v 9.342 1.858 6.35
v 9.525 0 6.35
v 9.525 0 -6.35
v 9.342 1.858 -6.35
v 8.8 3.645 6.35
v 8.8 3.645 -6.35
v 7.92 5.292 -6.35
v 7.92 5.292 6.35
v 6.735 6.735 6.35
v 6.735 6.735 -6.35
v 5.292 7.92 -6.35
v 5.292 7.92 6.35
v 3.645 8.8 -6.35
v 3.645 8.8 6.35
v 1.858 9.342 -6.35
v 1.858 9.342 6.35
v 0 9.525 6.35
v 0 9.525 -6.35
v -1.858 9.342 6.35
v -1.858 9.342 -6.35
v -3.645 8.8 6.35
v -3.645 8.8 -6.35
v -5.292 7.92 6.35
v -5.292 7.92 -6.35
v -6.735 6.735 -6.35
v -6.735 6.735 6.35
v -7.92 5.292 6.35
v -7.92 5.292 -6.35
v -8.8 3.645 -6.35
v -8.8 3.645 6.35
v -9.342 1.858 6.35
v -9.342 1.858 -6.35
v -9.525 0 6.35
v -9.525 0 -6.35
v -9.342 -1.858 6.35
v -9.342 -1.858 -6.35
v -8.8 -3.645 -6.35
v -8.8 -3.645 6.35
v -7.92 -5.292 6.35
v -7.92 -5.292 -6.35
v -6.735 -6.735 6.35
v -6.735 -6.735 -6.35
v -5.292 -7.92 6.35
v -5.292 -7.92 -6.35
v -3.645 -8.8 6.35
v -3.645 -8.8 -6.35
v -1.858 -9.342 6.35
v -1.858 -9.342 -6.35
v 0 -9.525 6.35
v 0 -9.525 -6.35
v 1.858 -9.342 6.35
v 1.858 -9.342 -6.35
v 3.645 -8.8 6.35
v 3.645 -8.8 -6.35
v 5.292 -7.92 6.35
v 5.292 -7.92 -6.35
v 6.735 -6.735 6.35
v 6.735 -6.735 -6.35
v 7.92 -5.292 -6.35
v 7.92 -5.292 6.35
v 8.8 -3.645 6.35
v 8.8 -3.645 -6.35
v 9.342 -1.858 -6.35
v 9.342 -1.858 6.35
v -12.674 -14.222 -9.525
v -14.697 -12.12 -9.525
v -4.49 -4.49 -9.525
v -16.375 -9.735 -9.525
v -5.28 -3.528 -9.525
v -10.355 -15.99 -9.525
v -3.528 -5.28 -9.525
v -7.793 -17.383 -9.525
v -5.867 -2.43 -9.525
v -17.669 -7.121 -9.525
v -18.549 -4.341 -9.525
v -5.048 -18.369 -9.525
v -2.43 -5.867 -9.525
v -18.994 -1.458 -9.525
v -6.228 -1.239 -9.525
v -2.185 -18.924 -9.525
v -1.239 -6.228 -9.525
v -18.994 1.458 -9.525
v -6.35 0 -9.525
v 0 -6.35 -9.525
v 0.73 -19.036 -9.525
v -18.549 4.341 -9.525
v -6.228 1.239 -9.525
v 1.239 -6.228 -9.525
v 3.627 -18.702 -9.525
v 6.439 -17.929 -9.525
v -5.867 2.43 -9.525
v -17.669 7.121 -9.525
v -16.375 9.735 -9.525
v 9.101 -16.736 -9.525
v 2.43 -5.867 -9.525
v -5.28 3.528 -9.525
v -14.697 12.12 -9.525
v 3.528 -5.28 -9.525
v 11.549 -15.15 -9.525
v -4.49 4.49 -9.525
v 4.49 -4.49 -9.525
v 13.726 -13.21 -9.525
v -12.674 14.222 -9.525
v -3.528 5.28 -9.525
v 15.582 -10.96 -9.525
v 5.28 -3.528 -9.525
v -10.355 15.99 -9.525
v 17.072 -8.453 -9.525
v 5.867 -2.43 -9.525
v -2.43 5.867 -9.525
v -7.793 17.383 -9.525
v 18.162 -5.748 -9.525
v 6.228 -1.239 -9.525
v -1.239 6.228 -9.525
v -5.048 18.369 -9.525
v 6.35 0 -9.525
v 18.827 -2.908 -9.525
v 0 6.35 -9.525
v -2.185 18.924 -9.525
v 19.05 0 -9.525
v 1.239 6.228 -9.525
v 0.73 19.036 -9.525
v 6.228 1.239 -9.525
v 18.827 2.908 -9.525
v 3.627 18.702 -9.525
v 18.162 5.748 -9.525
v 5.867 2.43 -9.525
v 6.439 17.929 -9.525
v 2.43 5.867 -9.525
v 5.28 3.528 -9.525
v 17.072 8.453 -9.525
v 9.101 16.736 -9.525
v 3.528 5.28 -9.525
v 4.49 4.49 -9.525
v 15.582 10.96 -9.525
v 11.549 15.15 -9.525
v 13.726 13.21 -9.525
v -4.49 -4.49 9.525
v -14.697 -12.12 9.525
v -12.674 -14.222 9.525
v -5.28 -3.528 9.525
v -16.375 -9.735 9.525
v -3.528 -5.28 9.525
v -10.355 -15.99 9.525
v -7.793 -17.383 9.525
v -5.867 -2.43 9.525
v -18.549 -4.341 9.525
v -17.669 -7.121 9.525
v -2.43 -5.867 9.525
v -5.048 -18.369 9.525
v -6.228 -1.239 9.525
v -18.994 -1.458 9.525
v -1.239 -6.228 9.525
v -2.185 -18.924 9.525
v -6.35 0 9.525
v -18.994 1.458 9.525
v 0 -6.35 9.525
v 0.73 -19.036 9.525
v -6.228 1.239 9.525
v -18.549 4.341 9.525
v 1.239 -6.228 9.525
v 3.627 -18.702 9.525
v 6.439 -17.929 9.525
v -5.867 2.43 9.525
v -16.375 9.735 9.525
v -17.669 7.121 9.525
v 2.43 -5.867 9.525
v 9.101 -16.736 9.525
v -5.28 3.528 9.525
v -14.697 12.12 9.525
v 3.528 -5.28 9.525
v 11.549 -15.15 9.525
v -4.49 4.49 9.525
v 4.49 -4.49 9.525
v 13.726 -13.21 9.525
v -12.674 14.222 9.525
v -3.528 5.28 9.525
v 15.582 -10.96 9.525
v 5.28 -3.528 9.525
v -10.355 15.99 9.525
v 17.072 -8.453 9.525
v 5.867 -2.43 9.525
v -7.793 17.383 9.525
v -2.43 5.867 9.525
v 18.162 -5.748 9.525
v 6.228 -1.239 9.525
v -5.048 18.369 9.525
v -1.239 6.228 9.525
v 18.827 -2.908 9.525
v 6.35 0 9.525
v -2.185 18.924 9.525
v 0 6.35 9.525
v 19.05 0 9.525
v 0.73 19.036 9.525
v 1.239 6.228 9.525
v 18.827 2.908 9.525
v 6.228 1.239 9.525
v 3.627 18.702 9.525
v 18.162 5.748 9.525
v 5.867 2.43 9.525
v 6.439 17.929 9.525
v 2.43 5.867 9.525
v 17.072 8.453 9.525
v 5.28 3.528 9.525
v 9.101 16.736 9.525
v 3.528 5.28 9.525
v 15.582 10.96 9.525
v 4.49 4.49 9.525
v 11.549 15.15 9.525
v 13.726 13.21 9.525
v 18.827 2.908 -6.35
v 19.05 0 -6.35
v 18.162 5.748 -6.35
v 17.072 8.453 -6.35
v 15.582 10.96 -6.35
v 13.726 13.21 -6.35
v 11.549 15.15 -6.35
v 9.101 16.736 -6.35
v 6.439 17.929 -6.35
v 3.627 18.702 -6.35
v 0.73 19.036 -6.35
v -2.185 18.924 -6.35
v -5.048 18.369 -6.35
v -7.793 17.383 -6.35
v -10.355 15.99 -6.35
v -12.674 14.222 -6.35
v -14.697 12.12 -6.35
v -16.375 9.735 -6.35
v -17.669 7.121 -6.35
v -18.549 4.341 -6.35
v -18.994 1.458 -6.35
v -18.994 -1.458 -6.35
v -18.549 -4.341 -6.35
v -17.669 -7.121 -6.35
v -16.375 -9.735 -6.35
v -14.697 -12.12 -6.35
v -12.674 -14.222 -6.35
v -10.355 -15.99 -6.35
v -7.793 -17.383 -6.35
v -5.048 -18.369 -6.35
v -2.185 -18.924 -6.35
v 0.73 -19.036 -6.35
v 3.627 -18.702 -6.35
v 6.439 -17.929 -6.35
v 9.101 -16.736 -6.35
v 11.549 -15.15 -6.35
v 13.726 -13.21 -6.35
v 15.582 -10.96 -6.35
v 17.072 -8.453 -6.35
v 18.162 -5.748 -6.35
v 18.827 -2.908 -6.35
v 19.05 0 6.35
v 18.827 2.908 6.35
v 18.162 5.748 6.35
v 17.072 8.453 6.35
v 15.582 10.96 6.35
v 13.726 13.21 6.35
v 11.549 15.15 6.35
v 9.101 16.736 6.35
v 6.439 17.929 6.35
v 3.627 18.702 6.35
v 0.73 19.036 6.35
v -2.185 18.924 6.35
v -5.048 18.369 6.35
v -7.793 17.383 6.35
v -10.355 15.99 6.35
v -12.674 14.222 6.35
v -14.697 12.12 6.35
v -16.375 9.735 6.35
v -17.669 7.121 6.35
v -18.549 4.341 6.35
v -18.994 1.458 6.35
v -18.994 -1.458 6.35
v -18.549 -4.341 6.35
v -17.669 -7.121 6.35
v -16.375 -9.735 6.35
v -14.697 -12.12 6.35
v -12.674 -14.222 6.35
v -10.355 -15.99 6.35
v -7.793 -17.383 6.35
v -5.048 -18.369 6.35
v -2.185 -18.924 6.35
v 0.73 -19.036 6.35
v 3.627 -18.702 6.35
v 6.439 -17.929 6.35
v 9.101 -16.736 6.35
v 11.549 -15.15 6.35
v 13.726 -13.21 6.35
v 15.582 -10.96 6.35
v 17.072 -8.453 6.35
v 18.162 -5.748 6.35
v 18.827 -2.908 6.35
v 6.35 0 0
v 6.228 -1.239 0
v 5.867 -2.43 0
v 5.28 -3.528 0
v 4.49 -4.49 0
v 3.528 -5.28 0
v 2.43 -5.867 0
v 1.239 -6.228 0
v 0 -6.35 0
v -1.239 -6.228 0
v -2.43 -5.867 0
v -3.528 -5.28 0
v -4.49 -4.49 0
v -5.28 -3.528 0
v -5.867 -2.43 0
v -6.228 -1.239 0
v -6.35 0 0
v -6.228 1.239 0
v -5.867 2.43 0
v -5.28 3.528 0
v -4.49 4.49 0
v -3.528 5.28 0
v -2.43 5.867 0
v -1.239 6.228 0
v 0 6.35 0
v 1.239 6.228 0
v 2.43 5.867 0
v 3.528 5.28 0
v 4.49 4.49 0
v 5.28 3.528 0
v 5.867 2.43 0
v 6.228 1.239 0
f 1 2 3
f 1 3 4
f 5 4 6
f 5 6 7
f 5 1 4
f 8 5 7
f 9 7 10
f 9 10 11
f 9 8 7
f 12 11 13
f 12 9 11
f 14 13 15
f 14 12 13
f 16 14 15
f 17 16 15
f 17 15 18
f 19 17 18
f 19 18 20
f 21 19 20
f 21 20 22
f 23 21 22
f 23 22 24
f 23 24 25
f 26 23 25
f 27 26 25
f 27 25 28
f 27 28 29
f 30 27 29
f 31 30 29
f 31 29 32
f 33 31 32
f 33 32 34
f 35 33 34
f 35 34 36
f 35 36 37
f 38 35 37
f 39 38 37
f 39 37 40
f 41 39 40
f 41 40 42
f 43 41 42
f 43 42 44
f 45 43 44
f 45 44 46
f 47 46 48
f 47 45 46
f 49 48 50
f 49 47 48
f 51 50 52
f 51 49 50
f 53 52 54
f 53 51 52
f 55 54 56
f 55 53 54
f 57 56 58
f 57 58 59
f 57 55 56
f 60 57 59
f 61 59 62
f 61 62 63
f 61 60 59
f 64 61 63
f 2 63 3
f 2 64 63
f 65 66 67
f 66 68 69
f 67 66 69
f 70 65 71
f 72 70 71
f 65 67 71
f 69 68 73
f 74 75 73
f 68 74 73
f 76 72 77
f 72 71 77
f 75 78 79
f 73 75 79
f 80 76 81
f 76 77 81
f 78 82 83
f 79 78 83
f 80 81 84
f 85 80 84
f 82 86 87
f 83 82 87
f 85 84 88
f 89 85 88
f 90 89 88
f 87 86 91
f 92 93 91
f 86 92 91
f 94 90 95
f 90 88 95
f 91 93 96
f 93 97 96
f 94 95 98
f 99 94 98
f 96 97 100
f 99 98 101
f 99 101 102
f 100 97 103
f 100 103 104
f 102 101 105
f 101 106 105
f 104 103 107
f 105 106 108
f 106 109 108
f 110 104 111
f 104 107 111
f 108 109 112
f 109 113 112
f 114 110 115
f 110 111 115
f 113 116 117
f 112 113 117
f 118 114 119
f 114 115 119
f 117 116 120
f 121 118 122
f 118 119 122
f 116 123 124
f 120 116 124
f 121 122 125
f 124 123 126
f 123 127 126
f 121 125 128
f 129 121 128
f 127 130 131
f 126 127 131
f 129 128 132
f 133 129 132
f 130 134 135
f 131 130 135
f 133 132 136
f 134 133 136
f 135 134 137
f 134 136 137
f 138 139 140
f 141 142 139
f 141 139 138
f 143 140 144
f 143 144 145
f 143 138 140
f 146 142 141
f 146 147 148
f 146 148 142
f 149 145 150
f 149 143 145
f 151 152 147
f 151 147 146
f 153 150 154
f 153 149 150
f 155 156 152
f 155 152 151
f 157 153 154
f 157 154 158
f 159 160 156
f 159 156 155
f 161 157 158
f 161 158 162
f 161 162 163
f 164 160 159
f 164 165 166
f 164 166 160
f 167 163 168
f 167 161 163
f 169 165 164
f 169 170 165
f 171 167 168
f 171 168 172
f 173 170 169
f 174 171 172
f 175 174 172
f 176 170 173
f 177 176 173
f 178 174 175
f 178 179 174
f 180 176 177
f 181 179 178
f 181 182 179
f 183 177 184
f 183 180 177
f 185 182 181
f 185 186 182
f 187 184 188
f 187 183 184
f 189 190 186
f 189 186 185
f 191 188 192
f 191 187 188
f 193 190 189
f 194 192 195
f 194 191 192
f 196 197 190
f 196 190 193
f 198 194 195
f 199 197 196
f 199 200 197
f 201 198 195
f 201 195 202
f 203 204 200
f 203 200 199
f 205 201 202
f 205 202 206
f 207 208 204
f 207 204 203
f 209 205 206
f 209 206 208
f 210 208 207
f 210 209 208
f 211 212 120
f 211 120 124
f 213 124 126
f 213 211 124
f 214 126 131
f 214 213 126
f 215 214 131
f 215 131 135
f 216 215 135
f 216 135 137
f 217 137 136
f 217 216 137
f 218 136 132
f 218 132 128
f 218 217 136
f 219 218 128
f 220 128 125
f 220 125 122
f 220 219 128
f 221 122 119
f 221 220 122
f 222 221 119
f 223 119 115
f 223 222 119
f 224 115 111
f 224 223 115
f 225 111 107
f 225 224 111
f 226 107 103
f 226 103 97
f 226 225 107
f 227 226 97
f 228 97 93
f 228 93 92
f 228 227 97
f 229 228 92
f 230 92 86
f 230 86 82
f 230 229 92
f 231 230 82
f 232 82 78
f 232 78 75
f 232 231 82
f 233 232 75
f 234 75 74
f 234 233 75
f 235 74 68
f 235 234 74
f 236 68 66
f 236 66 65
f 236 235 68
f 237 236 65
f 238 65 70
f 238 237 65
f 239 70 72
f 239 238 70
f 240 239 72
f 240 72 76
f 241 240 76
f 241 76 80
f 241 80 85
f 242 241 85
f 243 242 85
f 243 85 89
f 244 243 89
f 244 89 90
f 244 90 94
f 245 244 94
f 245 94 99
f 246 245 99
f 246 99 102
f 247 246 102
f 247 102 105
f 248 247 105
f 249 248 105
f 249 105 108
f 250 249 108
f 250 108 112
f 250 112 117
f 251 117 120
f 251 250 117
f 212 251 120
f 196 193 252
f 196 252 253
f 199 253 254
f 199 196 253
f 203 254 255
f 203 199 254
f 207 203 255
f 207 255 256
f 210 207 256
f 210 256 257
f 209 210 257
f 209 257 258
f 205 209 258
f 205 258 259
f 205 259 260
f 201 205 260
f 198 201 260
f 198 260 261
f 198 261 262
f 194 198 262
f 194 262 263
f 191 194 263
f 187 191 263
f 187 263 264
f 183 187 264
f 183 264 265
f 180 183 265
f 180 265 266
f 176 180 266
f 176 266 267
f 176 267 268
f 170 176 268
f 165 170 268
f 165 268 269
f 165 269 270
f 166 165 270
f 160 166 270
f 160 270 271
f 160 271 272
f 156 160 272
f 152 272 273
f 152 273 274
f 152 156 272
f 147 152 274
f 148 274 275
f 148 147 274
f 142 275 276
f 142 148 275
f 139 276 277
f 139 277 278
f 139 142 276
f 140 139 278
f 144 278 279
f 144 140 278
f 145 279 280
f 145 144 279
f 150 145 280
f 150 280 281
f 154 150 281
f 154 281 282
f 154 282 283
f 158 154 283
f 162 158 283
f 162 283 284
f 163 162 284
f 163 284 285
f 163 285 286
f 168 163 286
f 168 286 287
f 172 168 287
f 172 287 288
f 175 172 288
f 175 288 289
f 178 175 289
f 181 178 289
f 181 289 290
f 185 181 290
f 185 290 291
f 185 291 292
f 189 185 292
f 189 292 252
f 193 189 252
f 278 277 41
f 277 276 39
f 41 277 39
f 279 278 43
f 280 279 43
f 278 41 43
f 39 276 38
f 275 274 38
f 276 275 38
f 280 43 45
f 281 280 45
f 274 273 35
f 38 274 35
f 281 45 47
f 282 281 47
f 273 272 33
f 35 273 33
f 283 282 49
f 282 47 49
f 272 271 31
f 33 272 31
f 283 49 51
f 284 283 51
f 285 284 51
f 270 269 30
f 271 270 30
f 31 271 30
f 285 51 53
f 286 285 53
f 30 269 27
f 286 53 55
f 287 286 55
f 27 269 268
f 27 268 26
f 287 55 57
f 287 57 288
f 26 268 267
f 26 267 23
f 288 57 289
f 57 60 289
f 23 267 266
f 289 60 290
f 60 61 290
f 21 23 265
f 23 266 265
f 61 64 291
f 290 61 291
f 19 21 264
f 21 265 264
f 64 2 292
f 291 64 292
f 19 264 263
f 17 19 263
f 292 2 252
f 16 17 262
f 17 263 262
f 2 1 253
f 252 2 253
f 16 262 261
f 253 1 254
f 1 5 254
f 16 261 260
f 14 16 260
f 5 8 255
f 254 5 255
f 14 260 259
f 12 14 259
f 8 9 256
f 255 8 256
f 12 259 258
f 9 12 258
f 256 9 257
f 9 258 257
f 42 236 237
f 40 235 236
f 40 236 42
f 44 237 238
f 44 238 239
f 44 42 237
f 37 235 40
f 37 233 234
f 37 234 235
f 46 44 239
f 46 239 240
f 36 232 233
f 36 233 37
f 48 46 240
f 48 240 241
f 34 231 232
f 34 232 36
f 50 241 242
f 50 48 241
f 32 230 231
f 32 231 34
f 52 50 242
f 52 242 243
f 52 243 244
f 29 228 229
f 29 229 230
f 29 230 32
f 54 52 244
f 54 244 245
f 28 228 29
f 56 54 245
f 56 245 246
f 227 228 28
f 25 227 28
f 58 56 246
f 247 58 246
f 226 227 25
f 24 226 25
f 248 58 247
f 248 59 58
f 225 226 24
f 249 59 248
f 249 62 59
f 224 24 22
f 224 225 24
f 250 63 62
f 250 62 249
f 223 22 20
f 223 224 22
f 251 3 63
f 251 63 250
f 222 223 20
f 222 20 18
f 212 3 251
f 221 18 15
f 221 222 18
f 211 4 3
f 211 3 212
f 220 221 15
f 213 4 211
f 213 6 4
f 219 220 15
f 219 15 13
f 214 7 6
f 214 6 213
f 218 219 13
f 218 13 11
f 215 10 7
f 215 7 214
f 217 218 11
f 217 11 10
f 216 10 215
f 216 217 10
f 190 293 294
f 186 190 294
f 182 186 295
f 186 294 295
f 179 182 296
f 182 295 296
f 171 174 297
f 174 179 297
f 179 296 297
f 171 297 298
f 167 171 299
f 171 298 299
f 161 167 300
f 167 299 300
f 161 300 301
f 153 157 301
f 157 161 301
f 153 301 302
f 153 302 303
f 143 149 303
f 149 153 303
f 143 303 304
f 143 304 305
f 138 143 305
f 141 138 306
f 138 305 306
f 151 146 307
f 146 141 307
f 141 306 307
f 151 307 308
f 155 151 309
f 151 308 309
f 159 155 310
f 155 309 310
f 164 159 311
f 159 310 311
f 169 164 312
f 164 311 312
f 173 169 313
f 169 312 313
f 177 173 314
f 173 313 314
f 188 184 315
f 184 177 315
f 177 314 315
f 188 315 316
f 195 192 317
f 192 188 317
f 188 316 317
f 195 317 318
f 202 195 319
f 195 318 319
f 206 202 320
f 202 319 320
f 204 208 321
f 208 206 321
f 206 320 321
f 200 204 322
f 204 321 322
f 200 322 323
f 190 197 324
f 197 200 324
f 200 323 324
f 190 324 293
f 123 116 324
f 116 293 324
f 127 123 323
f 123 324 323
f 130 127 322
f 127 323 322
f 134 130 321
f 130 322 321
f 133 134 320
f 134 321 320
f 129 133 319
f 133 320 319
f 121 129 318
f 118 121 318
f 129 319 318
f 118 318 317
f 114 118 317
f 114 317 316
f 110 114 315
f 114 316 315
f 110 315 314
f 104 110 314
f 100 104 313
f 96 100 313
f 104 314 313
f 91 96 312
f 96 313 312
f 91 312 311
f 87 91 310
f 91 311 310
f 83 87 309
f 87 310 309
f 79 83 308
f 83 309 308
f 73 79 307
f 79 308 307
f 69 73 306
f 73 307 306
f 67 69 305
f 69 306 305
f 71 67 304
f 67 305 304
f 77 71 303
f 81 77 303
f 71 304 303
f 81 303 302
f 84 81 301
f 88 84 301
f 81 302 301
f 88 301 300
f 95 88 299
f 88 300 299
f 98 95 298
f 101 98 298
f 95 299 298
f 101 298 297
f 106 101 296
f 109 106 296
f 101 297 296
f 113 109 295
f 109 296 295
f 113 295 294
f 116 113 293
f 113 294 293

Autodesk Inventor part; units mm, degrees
ref_plane "YZ Plane" through (0, 0, 0) normal (1, 0, 0) x (0, 1, 0)
ref_plane "XZ Plane" through (0, 0, 0) normal (0, 1, 0) x (-1, 0, 0)
ref_plane "XY Plane" through (0, 0, 0) normal (0, 0, 1) x (1, 0, 0)
sketch "Sketch1" plane through (0, 0, 0) normal (0, 0, 1) x (1, 0, 0)
  circle A0 centre (0, 0) radius 19.05
  circle A1 centre (0, 0) radius 9.525
  circle A2 centre (0, 0) radius 6.35
  dimension "d0" = 38.1
  dimension "d1" = 19.05
  dimension "d2" = 12.7
extrude "Extrusion1" add sketch "Sketch1" along normal mid plane 19.05 contours A0 | A1
extrude "Extrusion2" cut sketch "Sketch1" along normal mid plane 12.7 contours A0
properties part number "1.5inch_sprocket"
